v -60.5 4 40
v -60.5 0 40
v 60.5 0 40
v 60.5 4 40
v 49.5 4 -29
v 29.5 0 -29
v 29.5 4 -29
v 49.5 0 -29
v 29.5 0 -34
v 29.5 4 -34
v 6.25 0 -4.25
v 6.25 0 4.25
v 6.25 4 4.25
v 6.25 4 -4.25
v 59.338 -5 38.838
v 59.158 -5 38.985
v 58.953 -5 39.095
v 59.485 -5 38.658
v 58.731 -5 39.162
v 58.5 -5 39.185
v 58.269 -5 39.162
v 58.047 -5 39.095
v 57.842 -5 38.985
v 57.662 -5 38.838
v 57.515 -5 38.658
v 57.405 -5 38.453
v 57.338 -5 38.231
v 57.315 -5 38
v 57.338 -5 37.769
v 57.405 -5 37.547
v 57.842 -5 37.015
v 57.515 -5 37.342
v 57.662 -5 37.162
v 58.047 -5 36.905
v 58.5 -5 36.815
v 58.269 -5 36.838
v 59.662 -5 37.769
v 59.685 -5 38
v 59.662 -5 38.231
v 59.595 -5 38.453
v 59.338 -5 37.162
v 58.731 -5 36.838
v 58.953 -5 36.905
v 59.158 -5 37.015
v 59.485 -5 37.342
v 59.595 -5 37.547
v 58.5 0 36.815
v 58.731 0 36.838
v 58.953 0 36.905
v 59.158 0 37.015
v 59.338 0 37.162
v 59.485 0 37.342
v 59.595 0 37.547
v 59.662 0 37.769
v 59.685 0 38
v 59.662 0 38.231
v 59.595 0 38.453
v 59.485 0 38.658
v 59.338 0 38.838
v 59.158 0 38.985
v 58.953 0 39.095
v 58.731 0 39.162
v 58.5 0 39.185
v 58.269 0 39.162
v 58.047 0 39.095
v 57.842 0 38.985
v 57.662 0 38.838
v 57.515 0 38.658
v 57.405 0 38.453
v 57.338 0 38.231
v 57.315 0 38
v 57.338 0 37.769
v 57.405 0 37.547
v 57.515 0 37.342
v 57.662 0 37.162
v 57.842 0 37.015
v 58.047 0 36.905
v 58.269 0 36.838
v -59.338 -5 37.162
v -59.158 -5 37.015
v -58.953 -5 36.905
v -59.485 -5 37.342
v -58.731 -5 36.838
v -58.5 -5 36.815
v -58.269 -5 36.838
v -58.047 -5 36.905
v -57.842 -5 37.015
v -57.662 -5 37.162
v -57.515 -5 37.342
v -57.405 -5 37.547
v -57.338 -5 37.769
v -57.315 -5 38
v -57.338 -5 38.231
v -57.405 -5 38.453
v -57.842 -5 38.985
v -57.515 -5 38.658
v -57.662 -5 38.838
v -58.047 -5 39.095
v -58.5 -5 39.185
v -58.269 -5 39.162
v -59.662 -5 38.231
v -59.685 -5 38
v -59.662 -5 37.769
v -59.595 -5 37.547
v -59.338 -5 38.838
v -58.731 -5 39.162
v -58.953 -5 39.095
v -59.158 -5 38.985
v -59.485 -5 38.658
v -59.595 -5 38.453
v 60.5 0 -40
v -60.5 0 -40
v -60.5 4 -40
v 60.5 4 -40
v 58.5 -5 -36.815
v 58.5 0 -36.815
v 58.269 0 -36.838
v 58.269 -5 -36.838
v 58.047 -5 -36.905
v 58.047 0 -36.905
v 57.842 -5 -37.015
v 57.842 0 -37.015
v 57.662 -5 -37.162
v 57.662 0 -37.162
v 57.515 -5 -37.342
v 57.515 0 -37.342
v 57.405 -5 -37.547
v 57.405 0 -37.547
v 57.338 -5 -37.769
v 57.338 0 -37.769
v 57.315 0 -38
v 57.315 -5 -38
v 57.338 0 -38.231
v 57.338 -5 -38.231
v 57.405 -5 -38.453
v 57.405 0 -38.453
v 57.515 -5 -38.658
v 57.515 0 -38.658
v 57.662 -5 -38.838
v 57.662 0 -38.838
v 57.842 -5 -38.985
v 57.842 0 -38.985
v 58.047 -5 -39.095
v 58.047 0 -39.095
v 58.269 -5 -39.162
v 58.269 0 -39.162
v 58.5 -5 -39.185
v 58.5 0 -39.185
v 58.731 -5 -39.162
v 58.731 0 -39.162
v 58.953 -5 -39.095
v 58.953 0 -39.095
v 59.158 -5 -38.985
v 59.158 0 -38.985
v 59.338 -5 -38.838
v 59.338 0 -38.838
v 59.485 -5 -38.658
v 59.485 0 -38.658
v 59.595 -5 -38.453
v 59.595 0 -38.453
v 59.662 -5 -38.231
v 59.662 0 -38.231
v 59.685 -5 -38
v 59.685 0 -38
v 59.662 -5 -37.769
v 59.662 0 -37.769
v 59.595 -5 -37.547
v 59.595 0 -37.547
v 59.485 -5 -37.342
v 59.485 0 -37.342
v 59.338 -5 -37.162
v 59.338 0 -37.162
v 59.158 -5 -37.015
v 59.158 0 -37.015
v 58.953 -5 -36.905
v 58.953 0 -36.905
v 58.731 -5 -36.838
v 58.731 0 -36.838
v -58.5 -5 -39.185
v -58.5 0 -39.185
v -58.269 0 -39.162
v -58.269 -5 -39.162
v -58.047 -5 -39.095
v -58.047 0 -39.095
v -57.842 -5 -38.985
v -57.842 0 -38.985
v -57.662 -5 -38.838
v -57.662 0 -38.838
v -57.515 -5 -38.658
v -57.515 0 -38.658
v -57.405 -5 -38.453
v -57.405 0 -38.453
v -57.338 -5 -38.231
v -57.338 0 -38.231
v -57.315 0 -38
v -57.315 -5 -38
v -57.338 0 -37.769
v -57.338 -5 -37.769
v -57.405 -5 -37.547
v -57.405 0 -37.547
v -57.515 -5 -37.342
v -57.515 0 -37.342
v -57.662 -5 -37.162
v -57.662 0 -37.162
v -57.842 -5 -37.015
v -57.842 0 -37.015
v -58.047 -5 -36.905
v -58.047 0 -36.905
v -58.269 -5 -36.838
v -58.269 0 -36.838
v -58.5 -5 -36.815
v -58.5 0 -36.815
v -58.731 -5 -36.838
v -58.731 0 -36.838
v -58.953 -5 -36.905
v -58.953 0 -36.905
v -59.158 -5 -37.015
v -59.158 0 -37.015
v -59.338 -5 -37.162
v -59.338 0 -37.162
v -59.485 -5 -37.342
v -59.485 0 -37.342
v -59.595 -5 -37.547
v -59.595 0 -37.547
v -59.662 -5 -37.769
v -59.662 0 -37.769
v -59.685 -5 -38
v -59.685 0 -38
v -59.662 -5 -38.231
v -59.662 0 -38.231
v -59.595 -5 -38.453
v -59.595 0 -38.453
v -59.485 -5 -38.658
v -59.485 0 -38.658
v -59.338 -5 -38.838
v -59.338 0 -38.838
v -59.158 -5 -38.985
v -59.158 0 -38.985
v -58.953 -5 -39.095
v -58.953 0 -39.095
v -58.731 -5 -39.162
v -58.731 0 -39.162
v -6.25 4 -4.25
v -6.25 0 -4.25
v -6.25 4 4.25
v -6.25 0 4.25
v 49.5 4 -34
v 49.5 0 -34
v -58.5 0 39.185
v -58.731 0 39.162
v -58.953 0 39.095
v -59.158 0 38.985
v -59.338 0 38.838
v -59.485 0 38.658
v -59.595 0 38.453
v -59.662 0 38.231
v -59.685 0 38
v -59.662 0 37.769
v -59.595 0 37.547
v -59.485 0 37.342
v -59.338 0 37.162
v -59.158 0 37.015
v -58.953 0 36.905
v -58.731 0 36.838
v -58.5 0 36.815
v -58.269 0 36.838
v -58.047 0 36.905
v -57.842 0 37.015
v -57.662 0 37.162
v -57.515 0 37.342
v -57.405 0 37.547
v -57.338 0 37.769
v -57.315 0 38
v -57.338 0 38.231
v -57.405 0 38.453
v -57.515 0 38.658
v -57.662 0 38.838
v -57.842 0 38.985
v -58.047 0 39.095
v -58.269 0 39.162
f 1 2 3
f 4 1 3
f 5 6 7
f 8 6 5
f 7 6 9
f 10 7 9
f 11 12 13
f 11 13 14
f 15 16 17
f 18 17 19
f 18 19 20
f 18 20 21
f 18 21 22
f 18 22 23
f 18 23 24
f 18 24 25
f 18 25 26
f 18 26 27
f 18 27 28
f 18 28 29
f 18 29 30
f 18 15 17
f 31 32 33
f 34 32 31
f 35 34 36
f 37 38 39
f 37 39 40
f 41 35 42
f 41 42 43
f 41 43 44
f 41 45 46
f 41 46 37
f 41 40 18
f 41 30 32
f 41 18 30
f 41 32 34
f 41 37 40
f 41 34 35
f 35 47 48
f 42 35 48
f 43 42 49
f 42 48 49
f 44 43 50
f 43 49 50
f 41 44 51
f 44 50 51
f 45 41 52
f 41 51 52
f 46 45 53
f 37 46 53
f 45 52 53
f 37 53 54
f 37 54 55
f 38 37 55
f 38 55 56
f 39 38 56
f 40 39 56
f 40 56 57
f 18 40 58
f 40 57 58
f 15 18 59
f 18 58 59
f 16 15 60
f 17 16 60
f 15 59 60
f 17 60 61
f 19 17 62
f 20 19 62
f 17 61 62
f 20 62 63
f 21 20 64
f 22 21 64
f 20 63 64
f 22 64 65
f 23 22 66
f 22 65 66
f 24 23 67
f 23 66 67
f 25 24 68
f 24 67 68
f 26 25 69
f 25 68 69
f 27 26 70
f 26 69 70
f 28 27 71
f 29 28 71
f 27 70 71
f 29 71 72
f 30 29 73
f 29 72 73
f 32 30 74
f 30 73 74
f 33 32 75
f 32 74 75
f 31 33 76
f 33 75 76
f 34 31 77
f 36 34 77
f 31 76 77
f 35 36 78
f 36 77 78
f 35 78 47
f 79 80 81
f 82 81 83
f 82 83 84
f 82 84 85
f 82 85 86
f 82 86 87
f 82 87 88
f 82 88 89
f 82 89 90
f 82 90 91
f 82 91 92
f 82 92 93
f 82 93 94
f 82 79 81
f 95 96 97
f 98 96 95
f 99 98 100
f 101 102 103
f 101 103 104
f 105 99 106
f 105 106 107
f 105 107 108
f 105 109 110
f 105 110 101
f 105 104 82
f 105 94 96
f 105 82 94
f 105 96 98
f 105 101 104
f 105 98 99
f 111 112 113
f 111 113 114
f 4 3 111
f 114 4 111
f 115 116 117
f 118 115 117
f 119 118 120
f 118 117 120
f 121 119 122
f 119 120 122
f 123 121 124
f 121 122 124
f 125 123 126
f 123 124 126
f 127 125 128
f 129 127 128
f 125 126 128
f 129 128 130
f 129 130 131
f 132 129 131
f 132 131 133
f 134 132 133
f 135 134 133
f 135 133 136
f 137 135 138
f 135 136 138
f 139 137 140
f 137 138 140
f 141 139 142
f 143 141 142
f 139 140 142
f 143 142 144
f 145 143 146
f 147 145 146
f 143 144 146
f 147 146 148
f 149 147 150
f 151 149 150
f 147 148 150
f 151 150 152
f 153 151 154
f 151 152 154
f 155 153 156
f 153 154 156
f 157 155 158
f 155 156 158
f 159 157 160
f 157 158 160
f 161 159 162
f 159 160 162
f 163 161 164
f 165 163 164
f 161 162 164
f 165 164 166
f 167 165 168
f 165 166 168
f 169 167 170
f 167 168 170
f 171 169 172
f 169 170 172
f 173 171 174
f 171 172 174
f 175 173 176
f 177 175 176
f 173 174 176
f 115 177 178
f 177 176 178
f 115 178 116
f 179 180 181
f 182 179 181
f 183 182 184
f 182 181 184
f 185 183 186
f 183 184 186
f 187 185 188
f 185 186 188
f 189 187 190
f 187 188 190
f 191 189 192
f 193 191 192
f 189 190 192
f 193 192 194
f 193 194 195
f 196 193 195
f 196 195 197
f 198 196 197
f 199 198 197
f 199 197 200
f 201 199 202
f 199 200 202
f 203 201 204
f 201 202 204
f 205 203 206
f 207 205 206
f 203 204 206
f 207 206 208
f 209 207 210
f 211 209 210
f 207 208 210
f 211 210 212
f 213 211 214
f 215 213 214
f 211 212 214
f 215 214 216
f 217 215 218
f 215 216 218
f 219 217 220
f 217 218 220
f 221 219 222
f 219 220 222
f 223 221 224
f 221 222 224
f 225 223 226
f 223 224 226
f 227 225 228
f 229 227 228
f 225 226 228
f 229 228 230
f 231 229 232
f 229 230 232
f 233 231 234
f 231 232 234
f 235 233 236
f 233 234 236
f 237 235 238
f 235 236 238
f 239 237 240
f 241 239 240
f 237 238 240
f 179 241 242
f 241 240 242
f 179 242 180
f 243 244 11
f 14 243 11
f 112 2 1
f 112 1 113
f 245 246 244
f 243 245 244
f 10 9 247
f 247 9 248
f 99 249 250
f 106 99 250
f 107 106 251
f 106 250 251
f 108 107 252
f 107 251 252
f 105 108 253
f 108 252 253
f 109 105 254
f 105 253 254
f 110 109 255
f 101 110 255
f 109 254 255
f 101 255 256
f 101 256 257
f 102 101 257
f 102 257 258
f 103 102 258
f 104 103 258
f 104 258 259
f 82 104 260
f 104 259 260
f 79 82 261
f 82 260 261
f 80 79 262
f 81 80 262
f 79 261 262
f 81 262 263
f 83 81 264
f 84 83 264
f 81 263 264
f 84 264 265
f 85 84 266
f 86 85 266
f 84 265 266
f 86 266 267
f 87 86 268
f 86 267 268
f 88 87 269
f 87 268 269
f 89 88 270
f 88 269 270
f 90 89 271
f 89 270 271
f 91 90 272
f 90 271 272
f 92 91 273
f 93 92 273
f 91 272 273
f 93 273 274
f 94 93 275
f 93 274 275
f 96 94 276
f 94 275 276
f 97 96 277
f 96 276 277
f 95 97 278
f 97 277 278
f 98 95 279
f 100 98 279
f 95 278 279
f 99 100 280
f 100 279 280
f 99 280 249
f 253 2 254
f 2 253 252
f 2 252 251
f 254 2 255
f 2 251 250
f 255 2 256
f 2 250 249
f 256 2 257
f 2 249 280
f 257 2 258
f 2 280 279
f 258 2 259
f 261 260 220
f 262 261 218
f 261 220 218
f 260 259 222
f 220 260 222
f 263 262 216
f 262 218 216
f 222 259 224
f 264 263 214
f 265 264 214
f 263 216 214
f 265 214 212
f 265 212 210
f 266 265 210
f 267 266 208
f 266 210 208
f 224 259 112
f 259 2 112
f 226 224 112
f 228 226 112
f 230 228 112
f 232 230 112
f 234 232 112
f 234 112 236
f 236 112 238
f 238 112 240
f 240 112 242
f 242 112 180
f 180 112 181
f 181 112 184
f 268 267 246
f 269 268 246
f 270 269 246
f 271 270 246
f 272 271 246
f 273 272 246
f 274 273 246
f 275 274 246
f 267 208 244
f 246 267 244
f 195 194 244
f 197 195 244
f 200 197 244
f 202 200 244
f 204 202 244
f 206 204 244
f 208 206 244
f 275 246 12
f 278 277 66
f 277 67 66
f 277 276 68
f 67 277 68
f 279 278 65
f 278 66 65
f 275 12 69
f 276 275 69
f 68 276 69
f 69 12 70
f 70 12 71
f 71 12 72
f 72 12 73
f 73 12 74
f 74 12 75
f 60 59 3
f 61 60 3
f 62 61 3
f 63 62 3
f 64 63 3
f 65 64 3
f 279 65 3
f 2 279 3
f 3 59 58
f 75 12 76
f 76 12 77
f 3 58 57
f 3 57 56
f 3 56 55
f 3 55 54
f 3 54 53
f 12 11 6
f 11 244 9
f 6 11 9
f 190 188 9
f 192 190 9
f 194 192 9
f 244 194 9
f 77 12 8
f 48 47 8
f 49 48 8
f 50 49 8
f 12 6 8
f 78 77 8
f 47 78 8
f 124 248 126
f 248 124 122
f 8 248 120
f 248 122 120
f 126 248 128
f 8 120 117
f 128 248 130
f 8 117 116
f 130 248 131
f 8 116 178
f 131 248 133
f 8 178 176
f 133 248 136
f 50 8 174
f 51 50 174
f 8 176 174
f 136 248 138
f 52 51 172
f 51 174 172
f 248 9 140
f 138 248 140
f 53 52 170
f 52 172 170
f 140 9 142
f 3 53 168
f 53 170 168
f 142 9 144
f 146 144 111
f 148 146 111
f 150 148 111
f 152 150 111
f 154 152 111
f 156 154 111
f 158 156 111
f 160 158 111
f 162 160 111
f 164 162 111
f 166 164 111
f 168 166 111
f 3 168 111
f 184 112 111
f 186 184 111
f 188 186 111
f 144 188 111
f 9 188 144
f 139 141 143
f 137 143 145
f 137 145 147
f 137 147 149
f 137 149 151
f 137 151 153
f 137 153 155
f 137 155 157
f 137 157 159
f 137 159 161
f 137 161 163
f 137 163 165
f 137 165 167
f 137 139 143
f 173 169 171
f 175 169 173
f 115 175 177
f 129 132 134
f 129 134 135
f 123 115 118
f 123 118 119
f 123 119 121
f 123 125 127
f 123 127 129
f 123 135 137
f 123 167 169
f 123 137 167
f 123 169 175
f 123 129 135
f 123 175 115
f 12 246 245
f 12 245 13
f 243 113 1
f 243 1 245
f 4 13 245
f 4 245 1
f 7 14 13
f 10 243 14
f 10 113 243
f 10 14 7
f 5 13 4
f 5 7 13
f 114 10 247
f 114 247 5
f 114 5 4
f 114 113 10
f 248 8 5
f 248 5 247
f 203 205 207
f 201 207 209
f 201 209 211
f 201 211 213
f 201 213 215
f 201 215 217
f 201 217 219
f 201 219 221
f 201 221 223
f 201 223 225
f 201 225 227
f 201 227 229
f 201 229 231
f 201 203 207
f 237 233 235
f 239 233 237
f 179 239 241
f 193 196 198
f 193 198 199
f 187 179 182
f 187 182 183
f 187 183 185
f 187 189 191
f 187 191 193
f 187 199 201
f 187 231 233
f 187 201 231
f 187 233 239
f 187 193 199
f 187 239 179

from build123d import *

# Parameters (mm, degrees)
SKETCH1_W           = 121
SKETCH1_H           = 80
SKETCH1_W_2         = 20
SKETCH1_H_2         = 5
SKETCH1_W_3         = 12.5
SKETCH1_H_3         = 8.5
BOSS_EXTRUDE1_DEPTH = 4
SKETCH4_R           = 1.185
BOSS_EXTRUDE2_DEPTH = 5


with BuildPart() as part:
    # Sketch1 → Boss-Extrude1 (new body)
    with BuildSketch(Plane(origin=(0, 0, 0), x_dir=(1, 0, 0), z_dir=(0, 1, 0))):
        Rectangle(SKETCH1_W, SKETCH1_H)
        with Locations((39.5, 31.5)):
            Rectangle(SKETCH1_W_2, SKETCH1_H_2, mode=Mode.SUBTRACT)
        Rectangle(SKETCH1_W_3, SKETCH1_H_3, mode=Mode.SUBTRACT)
    extrude(amount=BOSS_EXTRUDE1_DEPTH)

    # Sketch4 → Boss-Extrude2 (add)
    with BuildSketch(Plane.XZ):
        with Locations(Location((-58.5, -38, 0), (0, 0, 270))):
            Circle(SKETCH4_R)
        with Locations(Location((-58.5, 38, 0), (0, 0, 90))):
            Circle(SKETCH4_R)
        with Locations(Location((58.5, -38, 0), (0, 0, 90))):
            Circle(SKETCH4_R)
        with Locations(Location((58.5, 38, 0), (0, 0, 270))):
            Circle(SKETCH4_R)
    extrude(amount=BOSS_EXTRUDE2_DEPTH)


solid = part.part
